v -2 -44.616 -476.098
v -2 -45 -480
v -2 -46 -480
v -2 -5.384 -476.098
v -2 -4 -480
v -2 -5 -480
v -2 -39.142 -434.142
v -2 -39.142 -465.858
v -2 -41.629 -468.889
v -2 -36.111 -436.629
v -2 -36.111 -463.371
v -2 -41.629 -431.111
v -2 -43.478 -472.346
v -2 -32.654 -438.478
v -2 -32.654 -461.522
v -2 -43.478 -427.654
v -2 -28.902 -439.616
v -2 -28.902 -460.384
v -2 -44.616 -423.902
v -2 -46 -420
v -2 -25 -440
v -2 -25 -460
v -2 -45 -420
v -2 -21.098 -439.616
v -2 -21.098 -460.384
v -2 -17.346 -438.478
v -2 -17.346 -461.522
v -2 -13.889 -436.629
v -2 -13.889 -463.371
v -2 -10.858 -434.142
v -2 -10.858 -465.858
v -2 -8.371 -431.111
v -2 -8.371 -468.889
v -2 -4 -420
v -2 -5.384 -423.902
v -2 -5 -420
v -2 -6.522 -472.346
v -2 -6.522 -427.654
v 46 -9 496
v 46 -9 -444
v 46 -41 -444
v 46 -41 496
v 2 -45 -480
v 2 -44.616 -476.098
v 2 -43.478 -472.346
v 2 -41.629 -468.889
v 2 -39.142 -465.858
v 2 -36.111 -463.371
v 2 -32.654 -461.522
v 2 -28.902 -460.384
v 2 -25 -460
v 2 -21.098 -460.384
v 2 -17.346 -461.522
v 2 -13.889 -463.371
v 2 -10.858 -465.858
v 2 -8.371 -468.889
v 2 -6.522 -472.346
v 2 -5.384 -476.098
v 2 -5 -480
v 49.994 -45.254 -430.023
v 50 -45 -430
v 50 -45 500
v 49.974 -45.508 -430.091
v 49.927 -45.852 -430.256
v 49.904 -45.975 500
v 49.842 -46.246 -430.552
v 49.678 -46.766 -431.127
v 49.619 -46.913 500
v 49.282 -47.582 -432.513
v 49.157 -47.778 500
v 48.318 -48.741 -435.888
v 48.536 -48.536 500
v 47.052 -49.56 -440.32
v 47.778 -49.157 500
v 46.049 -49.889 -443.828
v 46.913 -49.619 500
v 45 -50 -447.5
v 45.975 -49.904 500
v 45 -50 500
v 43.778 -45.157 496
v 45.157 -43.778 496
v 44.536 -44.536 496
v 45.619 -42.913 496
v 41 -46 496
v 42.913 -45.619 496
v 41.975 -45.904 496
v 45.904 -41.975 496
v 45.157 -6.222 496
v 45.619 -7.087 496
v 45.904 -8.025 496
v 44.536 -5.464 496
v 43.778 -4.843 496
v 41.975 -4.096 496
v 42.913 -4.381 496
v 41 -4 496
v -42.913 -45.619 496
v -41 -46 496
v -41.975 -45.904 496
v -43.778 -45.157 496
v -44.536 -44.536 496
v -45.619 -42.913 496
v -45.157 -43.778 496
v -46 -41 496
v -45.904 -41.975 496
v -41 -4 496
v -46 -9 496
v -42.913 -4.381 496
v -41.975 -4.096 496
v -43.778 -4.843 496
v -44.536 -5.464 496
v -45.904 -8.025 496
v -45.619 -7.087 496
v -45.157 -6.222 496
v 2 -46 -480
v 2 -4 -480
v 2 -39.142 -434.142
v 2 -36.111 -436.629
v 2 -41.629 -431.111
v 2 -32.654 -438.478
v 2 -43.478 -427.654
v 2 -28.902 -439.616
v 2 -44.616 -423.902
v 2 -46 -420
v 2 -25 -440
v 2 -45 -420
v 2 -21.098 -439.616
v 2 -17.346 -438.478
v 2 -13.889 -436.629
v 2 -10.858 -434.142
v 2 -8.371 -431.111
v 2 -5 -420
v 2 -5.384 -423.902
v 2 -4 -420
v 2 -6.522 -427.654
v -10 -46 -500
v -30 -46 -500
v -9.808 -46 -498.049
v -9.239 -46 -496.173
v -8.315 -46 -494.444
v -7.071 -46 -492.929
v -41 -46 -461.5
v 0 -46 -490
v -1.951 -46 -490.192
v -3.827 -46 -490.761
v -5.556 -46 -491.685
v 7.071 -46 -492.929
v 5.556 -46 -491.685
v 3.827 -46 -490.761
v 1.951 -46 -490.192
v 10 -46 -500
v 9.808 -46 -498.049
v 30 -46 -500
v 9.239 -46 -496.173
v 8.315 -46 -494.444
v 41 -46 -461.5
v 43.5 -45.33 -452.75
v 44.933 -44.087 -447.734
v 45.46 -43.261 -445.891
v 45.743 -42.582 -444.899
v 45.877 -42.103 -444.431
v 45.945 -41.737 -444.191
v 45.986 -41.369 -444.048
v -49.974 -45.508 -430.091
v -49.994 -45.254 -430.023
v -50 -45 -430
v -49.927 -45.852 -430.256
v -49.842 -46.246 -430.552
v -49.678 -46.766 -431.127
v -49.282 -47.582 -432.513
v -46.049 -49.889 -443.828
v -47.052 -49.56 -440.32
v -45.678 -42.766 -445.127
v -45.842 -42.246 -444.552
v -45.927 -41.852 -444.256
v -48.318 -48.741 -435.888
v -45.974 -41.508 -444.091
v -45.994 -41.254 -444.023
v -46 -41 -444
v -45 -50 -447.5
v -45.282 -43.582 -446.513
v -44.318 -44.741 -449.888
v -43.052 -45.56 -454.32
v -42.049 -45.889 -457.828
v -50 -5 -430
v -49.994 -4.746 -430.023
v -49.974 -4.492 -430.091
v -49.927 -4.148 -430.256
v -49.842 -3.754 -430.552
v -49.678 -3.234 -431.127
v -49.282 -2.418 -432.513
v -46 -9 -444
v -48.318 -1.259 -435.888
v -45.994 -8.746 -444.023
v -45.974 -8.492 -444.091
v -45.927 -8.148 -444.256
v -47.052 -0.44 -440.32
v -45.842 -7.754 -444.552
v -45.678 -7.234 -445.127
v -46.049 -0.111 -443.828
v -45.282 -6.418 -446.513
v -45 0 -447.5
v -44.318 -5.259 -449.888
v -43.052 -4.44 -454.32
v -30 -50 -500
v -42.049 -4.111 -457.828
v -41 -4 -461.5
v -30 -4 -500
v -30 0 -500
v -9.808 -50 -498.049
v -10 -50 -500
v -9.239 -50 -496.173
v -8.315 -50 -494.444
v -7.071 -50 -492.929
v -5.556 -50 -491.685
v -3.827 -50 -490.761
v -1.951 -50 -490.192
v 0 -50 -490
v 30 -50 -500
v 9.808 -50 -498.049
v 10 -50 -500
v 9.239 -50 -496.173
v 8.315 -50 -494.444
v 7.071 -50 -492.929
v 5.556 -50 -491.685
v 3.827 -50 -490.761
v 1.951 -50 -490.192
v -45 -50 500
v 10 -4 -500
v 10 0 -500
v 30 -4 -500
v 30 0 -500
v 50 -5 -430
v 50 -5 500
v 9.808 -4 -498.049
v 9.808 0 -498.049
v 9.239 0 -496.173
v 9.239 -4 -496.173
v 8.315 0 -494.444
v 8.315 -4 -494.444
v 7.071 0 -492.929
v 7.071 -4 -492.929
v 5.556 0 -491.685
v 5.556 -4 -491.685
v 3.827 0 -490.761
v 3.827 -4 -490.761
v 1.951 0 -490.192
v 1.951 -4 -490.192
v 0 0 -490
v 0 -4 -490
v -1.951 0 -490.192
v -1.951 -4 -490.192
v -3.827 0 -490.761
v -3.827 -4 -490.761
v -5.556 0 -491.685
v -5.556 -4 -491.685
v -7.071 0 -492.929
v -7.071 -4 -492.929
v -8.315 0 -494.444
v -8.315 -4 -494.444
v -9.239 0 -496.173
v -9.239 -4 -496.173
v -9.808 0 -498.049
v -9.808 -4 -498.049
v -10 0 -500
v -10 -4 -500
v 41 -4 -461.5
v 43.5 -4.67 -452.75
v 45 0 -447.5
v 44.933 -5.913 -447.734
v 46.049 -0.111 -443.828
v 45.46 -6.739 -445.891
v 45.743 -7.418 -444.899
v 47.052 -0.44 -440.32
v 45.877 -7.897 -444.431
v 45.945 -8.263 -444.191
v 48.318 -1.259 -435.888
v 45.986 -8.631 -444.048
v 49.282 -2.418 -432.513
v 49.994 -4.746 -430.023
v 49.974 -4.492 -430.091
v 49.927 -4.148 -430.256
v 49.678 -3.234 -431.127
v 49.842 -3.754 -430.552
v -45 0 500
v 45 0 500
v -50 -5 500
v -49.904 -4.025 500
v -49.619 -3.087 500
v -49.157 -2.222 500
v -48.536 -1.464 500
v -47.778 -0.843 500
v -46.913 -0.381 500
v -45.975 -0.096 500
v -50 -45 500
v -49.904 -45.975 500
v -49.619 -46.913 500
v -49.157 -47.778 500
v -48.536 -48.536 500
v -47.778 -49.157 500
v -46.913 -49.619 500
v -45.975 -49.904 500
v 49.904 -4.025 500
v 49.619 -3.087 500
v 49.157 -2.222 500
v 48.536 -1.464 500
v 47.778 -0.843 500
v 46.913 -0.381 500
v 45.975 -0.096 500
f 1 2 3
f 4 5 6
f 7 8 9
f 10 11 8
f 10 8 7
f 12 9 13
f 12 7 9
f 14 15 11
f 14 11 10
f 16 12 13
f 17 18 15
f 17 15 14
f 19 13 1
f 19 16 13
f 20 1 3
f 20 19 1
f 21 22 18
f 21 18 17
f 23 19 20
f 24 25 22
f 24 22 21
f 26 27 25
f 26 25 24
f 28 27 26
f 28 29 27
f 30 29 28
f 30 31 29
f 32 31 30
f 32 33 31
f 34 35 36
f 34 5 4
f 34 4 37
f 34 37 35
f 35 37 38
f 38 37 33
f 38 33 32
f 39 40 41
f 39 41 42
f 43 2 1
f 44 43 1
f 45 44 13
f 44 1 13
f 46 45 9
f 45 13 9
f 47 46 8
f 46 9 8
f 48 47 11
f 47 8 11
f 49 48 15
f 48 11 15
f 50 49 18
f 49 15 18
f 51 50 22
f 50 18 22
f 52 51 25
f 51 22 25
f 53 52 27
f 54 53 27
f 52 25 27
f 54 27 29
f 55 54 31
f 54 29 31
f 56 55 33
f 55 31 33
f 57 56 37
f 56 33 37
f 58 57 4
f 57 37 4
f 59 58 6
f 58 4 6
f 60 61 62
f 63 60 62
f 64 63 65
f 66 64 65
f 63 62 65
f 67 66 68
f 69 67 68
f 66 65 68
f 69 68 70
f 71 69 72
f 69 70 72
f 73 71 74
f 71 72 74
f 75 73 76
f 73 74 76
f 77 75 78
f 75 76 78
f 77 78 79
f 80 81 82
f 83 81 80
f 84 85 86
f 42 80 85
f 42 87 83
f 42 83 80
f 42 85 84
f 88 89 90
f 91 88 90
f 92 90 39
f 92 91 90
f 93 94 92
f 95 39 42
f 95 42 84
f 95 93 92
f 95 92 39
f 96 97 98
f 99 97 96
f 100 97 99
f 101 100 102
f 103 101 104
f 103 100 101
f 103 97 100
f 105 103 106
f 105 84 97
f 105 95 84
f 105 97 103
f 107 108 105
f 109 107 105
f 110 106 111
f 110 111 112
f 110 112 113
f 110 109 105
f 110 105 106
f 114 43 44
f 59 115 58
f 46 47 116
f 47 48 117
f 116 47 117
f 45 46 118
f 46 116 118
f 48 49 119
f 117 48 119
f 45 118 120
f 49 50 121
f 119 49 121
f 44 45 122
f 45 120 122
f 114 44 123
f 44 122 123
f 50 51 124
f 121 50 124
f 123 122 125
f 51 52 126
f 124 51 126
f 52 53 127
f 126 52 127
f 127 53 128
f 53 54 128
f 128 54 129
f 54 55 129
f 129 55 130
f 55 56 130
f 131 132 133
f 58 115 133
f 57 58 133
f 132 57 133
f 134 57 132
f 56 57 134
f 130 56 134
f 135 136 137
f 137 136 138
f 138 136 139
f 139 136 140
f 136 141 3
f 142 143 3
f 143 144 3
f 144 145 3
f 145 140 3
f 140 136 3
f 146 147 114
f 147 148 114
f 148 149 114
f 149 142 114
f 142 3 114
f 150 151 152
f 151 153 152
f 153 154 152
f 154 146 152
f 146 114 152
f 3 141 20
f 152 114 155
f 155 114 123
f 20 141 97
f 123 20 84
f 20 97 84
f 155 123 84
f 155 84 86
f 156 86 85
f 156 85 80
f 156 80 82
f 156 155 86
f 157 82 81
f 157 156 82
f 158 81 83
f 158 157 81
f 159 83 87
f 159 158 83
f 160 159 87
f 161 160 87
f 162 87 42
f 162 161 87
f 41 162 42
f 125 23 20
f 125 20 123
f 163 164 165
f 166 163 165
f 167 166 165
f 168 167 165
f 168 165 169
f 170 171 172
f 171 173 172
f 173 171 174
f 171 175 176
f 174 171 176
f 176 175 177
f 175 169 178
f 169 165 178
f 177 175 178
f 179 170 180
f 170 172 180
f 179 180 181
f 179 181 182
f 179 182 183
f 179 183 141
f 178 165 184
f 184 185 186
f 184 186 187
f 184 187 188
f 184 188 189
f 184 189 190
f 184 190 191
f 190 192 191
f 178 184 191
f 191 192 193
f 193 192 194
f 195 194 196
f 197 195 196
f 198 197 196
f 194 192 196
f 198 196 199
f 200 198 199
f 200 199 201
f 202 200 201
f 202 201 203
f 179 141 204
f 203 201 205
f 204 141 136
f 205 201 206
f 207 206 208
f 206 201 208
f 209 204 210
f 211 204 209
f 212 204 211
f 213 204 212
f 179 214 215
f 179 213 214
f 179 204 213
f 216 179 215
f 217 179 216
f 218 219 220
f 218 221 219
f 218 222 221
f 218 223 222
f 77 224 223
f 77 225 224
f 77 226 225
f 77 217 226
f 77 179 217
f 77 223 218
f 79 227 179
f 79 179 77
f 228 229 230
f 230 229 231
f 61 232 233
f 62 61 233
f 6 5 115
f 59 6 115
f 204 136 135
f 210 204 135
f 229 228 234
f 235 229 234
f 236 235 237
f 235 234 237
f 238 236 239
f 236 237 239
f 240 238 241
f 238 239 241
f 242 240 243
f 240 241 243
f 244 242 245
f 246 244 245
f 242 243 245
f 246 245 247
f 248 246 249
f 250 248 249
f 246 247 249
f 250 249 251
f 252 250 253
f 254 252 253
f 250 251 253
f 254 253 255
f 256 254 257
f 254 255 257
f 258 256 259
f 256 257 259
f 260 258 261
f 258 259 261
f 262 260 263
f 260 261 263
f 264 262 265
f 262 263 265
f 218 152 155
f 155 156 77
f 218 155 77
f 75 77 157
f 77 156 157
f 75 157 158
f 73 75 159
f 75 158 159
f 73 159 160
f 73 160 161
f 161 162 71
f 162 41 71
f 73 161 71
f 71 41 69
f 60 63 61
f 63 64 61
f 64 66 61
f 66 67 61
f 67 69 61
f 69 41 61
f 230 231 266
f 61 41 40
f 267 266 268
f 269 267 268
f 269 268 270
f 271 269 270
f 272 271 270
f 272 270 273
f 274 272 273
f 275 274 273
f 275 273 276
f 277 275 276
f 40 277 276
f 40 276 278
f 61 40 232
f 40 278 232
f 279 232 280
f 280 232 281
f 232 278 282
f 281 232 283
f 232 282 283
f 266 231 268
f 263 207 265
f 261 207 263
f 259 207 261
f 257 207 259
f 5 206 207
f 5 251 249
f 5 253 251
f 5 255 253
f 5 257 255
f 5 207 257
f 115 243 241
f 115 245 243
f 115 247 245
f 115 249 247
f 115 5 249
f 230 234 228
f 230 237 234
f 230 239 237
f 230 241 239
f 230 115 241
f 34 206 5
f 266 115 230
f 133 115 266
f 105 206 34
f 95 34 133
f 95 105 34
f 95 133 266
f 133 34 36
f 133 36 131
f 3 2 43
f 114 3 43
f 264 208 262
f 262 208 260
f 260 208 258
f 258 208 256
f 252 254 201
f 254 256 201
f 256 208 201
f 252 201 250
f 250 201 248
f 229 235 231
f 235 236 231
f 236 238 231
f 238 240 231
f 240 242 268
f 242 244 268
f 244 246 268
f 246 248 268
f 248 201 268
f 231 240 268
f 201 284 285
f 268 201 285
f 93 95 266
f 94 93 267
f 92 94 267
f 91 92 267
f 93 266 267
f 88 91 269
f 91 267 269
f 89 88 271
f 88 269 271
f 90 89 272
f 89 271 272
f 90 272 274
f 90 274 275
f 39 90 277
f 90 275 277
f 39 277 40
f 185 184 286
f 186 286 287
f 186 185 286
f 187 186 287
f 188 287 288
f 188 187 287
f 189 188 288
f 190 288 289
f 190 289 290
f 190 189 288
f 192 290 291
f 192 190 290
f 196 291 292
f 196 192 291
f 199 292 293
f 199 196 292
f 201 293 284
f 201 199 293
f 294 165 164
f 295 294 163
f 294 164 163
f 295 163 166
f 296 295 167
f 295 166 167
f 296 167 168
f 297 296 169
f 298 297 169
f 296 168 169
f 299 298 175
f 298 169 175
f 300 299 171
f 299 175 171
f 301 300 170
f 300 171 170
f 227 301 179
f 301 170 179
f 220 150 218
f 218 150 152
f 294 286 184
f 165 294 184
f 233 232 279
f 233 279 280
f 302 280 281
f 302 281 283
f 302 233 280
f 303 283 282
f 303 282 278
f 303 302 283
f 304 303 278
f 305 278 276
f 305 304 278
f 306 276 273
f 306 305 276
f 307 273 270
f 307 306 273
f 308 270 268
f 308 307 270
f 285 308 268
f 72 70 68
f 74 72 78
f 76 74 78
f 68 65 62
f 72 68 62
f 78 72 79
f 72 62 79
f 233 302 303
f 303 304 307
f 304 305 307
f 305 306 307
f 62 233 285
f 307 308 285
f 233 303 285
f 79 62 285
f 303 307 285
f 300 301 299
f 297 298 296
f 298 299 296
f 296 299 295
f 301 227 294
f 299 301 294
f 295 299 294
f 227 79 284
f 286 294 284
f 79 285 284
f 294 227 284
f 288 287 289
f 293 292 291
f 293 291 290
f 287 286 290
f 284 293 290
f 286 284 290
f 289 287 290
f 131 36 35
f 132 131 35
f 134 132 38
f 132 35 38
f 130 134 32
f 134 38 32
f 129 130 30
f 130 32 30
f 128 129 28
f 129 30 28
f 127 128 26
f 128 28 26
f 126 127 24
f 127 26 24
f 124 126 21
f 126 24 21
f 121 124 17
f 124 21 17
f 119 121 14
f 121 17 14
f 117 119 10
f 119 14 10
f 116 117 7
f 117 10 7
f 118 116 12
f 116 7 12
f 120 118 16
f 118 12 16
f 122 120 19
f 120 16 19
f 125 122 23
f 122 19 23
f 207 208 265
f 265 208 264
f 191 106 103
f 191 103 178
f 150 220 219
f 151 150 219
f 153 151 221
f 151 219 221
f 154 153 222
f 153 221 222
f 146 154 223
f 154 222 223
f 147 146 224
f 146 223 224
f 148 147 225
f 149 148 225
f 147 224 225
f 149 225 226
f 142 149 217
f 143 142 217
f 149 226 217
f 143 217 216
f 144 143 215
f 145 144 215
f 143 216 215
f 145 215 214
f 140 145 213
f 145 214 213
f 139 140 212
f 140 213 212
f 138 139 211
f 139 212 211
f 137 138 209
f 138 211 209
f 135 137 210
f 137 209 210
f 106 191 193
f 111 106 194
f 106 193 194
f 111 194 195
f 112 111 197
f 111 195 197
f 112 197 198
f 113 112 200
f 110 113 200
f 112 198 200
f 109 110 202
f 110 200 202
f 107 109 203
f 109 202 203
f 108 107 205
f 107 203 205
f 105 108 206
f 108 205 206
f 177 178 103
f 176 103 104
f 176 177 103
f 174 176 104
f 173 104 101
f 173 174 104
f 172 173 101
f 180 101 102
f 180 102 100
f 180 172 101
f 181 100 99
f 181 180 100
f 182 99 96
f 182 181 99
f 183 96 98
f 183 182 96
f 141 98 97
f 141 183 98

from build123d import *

# Parameters (mm, degrees)
F1_DEPTH = 50
F2_T     = -4
F3_R     = 5
F5_D     = 20
F6_W     = 4
F6_H     = 60
F7_DEPTH = 42
F9_D     = 40
F9_DEPTH = 4
F9_TIP   = 12.0172123806


with BuildPart() as f1:
    # F0 (on Front) → F1 (new body)
    with BuildSketch(Plane.XZ):
        Polygon((-50, -430), (-30, -500), (30, -500), (50, -430), (50, 500), (-50, 500), align=None)
    extrude(amount=F1_DEPTH)

    # F2
    f2_openings = [f1.faces().sort_by_distance(p)[0] for p in [
        (0, -25, -500),
        (-40, -25, -465),
        (40, -25, -465),
    ]]
    offset(amount=F2_T, openings=f2_openings)

    # F3
    f3_edges = [f1.edges().sort_by_distance(p)[0] for p in [
        (50, -50, 35),
        (50, 0, 35),
        (-50, 0, 35),
        (-50, -50, 35),
        (-46, -4, 26),
        (46, -4, 26),
        (46, -46, 26),
        (-46, -46, 26),
    ]]
    fillet(f3_edges, radius=F3_R)

    # F5 (through all)
    with Locations(Plane(origin=(0, 0, 0), x_dir=(-1, 0, 0), z_dir=(0, 1, 0))):
        with Locations((0, -500)):
            Hole(F5_D / 2)

    # F6 (on face) → F7 (join)
    with BuildSketch(Plane.XZ.offset(4)):
        with Locations((0, -450)):
            Rectangle(F6_W, F6_H)
    extrude(amount=F7_DEPTH)

    # F9 (one way)
    with BuildSketch(Plane(origin=(-2, 0, 0), x_dir=(0, -1, 0), z_dir=(-1, 0, 0))):
        with Locations((25, -480), (25, -420)):
            Circle(F9_D / 2)
    extrude(amount=-F9_DEPTH, mode=Mode.SUBTRACT)
    with Locations(Plane(origin=(-2, 0, 0), x_dir=(0, -1, 0), z_dir=(-1, 0, 0))):
        with Locations((25, -480), (25, -420)):
            with Locations((0, 0, -(F9_DEPTH + F9_TIP / 2))):  # 118° drill point
                Cone(0, F9_D / 2, F9_TIP, mode=Mode.SUBTRACT)


solid = f1.part
